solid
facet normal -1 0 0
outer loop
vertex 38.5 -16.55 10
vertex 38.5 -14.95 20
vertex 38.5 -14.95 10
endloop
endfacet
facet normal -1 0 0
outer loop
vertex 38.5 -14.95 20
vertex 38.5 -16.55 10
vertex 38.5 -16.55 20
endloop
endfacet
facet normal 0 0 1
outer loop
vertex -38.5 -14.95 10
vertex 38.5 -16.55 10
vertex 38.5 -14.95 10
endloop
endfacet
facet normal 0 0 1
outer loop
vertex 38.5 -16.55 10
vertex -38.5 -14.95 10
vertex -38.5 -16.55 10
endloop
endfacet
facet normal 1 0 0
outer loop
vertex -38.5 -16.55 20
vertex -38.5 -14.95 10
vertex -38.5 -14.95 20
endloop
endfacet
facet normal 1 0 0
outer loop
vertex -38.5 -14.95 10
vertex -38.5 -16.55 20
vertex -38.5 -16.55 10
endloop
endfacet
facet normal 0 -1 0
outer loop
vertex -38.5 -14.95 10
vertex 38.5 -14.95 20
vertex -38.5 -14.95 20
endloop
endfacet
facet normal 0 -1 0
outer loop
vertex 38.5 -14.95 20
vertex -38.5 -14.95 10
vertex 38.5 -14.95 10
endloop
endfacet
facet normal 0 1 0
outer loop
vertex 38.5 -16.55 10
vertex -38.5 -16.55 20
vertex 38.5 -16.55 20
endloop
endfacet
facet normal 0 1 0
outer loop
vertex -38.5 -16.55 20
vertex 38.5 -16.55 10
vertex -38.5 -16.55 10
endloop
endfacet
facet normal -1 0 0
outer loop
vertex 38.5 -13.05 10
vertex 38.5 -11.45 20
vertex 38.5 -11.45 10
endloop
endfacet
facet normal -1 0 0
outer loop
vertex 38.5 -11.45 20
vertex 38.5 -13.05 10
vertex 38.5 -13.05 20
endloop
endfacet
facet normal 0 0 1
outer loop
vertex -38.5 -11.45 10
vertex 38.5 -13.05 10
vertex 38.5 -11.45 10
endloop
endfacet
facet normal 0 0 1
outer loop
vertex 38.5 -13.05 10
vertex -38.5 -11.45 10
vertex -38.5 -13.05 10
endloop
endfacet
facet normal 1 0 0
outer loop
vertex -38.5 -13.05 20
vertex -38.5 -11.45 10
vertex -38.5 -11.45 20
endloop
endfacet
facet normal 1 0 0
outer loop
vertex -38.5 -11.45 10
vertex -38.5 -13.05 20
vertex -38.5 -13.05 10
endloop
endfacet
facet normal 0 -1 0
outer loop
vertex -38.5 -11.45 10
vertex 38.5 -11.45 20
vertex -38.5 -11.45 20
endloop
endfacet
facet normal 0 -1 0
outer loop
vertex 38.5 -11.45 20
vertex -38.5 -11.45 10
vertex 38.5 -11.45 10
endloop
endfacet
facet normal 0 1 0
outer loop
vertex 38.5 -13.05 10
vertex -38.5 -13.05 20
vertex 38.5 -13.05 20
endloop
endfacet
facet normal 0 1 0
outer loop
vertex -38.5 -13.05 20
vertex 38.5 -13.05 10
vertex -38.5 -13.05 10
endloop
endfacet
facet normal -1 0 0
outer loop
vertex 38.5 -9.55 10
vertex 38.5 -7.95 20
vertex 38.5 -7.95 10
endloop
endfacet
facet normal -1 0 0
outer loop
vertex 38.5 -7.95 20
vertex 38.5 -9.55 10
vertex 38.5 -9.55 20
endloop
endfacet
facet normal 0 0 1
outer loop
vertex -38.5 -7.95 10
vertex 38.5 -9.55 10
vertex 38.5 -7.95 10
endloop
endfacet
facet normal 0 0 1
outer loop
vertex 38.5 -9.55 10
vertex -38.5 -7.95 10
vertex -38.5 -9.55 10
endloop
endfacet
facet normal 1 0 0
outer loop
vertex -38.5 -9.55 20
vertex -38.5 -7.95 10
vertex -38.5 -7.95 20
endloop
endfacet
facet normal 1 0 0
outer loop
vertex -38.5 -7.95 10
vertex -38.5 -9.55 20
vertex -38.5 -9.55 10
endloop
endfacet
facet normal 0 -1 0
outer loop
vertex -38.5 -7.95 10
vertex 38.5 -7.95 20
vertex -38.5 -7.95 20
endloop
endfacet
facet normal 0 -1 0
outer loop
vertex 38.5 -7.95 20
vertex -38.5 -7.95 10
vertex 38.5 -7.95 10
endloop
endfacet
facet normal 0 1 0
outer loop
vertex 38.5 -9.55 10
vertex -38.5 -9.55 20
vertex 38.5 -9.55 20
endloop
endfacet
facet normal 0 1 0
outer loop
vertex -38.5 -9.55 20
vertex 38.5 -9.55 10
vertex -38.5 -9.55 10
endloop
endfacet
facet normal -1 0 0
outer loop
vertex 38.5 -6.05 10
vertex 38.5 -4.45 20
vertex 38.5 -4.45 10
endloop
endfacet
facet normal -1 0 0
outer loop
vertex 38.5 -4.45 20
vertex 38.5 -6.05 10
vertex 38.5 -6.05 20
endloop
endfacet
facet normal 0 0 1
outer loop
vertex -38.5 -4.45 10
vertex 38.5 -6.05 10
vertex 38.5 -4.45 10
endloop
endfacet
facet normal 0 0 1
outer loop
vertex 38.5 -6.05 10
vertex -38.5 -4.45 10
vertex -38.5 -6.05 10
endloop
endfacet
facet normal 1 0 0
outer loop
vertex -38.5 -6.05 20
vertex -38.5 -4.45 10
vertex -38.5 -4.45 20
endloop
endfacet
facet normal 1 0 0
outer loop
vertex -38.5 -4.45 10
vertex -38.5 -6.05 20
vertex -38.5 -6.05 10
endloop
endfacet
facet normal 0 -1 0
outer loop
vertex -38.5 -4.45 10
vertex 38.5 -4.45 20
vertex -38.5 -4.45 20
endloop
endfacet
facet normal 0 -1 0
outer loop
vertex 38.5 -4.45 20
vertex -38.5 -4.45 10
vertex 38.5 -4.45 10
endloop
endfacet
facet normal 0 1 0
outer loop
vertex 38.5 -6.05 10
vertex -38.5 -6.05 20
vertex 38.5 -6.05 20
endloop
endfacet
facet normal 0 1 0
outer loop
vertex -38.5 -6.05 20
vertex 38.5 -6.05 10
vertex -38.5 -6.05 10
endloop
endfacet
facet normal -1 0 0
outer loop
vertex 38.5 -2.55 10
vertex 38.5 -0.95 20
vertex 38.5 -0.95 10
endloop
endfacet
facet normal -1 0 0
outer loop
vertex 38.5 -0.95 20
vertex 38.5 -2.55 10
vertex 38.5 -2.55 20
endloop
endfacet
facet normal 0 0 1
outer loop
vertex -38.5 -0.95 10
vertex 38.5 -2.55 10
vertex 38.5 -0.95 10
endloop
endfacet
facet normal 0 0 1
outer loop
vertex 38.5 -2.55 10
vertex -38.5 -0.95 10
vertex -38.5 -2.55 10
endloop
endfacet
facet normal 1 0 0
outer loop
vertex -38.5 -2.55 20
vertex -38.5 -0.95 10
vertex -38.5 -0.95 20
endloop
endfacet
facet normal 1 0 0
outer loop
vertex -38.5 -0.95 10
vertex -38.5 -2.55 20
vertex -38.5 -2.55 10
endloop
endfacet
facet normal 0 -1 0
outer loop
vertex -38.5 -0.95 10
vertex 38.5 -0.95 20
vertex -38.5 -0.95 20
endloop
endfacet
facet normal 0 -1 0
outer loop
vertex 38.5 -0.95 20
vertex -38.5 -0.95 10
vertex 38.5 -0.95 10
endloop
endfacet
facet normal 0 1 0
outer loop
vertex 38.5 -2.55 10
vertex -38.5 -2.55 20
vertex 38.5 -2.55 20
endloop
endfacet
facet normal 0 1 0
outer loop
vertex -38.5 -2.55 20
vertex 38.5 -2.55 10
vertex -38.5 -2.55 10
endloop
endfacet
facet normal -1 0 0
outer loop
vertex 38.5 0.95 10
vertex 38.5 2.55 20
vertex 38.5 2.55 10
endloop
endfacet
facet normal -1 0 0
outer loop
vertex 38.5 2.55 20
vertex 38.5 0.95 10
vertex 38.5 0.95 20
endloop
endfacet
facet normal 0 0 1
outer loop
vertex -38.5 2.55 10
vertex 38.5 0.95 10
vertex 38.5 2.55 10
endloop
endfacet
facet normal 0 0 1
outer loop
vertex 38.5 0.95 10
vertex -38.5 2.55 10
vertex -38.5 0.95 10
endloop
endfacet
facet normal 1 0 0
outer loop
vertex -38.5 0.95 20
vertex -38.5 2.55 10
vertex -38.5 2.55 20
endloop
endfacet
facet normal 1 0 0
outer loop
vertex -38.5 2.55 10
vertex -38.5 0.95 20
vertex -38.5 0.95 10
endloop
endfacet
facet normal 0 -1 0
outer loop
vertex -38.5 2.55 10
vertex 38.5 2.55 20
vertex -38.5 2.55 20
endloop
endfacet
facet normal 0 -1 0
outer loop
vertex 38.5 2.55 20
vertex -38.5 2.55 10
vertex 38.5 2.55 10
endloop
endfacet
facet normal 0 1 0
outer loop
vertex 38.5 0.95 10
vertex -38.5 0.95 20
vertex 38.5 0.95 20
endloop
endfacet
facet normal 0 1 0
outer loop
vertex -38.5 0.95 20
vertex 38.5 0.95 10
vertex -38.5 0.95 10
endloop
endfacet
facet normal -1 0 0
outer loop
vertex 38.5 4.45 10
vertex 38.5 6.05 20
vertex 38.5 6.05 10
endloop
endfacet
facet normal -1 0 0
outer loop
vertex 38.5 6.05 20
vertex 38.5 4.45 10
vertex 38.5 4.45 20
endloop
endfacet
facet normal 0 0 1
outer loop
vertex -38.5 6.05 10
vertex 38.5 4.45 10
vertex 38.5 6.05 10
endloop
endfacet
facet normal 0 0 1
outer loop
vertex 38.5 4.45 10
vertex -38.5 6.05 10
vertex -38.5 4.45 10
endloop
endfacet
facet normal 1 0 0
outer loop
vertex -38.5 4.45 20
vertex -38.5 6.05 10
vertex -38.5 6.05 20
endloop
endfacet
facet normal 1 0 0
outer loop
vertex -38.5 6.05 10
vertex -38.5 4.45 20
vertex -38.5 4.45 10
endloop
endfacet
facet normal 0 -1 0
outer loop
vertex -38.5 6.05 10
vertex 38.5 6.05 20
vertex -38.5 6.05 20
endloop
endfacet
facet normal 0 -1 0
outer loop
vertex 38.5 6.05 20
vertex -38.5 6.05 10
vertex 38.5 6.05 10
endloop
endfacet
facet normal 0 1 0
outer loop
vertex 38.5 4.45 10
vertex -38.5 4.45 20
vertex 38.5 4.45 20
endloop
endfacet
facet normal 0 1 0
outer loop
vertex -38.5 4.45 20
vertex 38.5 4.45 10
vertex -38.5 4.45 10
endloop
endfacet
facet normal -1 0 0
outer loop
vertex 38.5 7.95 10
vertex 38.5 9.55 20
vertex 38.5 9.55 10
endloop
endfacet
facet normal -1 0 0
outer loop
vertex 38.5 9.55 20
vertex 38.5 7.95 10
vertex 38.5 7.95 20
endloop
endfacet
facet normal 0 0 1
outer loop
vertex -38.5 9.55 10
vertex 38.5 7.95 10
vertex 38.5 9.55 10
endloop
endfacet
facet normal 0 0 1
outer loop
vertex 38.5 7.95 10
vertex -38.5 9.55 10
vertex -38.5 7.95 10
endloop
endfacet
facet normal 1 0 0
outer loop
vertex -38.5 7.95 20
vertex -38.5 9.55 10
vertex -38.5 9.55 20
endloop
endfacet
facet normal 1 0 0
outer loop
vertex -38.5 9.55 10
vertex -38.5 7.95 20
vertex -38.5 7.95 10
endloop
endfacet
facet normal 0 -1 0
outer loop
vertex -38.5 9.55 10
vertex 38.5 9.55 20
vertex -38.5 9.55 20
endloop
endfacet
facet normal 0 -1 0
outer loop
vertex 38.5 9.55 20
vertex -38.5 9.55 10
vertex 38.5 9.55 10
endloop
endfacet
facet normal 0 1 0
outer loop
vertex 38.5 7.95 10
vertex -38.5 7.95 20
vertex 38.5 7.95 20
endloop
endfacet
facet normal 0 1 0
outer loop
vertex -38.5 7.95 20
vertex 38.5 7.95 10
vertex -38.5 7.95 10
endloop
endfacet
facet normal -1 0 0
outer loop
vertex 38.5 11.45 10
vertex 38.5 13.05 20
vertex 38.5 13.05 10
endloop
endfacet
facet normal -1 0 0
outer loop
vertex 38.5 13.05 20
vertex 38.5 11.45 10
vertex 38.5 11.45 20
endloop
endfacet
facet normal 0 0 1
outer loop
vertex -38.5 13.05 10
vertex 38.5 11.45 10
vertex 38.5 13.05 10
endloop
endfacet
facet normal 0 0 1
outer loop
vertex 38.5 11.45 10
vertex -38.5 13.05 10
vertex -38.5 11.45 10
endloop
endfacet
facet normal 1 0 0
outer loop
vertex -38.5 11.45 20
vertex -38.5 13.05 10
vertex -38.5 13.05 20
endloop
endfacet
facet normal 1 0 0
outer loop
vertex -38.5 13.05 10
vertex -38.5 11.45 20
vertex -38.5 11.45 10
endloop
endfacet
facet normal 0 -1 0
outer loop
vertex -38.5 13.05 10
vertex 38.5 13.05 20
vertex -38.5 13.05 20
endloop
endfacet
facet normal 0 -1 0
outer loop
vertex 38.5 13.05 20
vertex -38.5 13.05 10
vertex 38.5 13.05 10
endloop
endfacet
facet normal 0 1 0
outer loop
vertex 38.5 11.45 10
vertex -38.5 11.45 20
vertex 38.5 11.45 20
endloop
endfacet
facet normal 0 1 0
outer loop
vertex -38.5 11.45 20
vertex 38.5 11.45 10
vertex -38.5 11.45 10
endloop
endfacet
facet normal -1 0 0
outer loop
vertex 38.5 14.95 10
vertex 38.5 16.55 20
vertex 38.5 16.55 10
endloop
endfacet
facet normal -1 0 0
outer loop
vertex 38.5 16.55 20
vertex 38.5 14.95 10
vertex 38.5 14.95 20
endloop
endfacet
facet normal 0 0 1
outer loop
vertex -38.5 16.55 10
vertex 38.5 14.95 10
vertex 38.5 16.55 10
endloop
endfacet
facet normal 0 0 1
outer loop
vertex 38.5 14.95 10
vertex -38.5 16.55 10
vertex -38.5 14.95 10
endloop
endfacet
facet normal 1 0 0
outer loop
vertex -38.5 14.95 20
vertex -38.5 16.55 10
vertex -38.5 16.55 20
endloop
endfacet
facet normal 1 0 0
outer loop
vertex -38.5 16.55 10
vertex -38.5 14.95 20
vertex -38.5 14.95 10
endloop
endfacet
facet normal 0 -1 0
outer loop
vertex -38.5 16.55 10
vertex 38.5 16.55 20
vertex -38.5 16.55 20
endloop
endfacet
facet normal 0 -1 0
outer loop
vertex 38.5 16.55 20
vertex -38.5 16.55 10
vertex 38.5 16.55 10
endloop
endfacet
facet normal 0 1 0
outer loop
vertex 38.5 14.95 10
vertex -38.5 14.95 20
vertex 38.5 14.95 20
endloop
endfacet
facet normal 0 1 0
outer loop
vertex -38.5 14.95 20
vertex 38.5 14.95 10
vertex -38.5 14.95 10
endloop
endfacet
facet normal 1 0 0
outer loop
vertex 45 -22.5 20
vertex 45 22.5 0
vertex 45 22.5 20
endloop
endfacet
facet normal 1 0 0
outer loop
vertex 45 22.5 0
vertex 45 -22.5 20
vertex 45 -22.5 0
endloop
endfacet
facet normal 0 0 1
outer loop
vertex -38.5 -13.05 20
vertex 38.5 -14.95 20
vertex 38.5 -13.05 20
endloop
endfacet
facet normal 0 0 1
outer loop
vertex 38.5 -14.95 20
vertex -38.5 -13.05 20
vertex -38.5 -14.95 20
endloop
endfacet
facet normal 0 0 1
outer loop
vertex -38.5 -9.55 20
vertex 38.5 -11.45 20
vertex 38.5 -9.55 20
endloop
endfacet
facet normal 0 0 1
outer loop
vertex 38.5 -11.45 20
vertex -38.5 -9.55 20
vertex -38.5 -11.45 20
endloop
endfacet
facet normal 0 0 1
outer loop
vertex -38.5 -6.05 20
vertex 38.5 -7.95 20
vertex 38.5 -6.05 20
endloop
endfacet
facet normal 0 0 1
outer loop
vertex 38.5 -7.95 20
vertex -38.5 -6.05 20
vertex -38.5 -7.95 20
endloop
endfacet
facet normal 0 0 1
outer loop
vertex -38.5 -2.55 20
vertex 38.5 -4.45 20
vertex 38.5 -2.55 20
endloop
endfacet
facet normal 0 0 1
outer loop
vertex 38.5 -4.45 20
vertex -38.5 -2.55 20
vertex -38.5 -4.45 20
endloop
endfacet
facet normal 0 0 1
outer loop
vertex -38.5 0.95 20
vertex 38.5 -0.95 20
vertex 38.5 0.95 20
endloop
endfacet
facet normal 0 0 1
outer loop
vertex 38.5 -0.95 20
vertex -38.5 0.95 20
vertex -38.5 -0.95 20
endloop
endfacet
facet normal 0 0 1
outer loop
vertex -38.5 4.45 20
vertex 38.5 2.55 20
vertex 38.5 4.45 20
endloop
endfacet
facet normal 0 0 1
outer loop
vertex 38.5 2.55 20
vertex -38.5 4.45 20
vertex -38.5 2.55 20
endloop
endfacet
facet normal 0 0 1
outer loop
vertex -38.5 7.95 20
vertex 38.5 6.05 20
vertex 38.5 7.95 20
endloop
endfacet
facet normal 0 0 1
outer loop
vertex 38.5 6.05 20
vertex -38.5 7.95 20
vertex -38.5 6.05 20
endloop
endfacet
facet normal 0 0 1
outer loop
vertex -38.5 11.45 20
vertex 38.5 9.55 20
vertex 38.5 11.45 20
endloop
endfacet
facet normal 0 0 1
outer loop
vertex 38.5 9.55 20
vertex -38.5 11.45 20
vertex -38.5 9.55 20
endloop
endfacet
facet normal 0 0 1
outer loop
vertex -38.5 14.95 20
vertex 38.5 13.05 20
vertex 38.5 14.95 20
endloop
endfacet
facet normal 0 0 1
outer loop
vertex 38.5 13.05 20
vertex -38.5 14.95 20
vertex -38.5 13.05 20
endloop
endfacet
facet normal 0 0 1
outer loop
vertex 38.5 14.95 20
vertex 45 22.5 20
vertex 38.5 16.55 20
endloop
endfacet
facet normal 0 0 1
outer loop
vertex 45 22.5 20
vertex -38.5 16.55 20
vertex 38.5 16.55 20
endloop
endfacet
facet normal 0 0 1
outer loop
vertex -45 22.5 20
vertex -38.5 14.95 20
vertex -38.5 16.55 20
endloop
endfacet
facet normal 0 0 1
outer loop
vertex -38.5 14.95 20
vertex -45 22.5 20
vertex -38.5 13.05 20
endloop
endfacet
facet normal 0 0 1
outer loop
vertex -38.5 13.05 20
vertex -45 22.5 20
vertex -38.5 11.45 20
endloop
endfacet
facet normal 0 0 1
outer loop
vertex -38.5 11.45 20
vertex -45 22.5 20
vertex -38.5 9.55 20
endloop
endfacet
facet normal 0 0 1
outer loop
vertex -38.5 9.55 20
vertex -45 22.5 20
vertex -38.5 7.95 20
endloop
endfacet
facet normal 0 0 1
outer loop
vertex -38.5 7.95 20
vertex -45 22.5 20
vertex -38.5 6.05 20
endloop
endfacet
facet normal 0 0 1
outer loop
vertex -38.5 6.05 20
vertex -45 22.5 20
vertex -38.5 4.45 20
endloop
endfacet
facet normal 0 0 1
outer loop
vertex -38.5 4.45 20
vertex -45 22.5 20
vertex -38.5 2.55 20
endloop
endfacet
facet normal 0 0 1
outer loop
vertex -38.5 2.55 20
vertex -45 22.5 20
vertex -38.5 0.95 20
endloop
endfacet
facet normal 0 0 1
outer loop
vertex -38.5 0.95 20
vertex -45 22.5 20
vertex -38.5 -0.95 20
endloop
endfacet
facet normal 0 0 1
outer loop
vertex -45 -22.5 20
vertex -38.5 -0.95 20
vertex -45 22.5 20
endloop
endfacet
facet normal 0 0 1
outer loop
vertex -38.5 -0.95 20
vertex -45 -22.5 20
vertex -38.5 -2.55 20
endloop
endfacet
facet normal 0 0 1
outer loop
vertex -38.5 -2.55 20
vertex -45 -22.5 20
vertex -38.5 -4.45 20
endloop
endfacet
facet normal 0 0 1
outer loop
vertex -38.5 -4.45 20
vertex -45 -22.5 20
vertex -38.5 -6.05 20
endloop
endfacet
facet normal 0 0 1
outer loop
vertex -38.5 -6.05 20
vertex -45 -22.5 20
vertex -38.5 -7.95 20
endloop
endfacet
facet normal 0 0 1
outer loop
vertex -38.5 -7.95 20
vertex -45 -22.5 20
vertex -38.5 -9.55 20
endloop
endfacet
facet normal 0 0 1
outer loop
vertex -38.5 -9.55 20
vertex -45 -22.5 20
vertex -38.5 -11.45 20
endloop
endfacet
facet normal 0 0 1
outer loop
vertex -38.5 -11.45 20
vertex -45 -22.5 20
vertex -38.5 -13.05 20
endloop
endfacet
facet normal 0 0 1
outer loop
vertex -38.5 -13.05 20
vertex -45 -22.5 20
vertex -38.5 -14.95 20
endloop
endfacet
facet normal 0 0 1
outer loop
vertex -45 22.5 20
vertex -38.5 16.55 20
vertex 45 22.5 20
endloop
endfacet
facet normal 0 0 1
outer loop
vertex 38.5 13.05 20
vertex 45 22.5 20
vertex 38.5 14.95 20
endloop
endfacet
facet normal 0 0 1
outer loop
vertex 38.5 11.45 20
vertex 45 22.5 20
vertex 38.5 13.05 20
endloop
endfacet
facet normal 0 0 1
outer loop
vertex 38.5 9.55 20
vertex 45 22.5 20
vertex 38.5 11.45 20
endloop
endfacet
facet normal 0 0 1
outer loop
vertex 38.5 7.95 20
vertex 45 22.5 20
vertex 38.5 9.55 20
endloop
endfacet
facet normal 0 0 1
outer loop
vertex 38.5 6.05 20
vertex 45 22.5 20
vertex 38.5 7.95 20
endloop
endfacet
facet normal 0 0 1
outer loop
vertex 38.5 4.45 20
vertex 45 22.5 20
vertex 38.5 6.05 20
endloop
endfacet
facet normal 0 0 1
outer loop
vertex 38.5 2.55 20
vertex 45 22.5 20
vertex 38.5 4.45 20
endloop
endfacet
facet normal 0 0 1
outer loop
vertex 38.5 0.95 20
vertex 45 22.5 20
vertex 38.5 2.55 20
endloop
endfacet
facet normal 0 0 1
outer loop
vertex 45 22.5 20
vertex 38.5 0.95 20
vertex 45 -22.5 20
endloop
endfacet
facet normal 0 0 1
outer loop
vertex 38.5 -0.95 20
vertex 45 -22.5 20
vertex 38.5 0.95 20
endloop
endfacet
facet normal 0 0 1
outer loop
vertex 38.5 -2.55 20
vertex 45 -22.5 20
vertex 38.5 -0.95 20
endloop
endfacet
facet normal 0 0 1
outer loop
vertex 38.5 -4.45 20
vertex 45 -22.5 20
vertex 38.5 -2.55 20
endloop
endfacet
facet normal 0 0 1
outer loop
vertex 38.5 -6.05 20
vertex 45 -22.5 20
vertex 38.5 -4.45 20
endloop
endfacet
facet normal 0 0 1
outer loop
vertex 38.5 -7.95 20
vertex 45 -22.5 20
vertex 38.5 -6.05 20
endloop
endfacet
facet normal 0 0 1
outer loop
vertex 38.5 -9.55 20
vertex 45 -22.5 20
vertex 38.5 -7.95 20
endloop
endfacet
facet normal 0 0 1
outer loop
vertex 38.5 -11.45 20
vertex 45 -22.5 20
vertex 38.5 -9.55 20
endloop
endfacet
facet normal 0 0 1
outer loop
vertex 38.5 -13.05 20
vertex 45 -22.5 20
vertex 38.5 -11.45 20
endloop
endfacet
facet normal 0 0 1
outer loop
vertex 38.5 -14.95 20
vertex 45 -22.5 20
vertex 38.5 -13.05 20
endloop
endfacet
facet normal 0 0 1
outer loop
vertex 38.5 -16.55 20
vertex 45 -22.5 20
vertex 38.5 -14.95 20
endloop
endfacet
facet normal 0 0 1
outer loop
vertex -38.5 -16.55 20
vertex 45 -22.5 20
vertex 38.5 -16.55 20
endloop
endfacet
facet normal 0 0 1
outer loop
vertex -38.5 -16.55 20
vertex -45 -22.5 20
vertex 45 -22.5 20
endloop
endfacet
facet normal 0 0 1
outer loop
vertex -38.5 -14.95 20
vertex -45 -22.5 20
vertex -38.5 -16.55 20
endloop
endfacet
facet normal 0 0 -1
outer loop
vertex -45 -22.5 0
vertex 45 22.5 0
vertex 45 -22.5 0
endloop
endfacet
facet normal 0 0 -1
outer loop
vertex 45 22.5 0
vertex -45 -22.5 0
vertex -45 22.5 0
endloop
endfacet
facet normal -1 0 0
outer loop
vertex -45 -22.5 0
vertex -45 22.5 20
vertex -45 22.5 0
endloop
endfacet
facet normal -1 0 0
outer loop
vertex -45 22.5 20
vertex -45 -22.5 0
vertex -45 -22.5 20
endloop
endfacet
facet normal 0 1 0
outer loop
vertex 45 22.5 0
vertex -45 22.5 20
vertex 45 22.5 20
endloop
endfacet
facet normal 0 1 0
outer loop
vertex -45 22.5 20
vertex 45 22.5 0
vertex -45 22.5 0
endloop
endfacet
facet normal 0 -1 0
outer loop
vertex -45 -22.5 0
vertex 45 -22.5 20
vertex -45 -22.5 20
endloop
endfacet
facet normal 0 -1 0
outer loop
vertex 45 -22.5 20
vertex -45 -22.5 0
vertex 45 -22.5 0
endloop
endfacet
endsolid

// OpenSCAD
// Microscope slide drying rack
// Print orientation: base block on XY plane, slots open upward (+Z)

// ---------------- Parameters ----------------
block_len    = 90;    // base block length along X (mm)
block_wid    = 45;    // base block width along Y (mm)
block_ht     = 20;    // base block height along Z (mm)

slot_count   = 10;    // number of slide slots
slot_len     = 77;    // slot length along X (mm)
slot_wid     = 1.6;   // slot width along Y (mm)
slot_depth   = 10;    // slot depth from top face (mm)
slot_pitch   = 3.5;   // centre-to-centre slot spacing along Y (mm)

eps          = 0.5;   // overcut past faces to avoid coplanar surfaces (mm)

$fn = 64;

// ---------------- Model ----------------
difference() {
    // Solid base block, centred in X and Y, resting on z = 0
    translate([-block_len/2, -block_wid/2, 0])
        cube([block_len, block_wid, block_ht]);

    // Parallel slots running along X, open at the top
    for (i = [0 : slot_count - 1]) {
        y_c = (i - (slot_count - 1)/2) * slot_pitch;
        translate([-slot_len/2, y_c - slot_wid/2, block_ht - slot_depth])
            cube([slot_len, slot_wid, slot_depth + eps]);
    }
}
